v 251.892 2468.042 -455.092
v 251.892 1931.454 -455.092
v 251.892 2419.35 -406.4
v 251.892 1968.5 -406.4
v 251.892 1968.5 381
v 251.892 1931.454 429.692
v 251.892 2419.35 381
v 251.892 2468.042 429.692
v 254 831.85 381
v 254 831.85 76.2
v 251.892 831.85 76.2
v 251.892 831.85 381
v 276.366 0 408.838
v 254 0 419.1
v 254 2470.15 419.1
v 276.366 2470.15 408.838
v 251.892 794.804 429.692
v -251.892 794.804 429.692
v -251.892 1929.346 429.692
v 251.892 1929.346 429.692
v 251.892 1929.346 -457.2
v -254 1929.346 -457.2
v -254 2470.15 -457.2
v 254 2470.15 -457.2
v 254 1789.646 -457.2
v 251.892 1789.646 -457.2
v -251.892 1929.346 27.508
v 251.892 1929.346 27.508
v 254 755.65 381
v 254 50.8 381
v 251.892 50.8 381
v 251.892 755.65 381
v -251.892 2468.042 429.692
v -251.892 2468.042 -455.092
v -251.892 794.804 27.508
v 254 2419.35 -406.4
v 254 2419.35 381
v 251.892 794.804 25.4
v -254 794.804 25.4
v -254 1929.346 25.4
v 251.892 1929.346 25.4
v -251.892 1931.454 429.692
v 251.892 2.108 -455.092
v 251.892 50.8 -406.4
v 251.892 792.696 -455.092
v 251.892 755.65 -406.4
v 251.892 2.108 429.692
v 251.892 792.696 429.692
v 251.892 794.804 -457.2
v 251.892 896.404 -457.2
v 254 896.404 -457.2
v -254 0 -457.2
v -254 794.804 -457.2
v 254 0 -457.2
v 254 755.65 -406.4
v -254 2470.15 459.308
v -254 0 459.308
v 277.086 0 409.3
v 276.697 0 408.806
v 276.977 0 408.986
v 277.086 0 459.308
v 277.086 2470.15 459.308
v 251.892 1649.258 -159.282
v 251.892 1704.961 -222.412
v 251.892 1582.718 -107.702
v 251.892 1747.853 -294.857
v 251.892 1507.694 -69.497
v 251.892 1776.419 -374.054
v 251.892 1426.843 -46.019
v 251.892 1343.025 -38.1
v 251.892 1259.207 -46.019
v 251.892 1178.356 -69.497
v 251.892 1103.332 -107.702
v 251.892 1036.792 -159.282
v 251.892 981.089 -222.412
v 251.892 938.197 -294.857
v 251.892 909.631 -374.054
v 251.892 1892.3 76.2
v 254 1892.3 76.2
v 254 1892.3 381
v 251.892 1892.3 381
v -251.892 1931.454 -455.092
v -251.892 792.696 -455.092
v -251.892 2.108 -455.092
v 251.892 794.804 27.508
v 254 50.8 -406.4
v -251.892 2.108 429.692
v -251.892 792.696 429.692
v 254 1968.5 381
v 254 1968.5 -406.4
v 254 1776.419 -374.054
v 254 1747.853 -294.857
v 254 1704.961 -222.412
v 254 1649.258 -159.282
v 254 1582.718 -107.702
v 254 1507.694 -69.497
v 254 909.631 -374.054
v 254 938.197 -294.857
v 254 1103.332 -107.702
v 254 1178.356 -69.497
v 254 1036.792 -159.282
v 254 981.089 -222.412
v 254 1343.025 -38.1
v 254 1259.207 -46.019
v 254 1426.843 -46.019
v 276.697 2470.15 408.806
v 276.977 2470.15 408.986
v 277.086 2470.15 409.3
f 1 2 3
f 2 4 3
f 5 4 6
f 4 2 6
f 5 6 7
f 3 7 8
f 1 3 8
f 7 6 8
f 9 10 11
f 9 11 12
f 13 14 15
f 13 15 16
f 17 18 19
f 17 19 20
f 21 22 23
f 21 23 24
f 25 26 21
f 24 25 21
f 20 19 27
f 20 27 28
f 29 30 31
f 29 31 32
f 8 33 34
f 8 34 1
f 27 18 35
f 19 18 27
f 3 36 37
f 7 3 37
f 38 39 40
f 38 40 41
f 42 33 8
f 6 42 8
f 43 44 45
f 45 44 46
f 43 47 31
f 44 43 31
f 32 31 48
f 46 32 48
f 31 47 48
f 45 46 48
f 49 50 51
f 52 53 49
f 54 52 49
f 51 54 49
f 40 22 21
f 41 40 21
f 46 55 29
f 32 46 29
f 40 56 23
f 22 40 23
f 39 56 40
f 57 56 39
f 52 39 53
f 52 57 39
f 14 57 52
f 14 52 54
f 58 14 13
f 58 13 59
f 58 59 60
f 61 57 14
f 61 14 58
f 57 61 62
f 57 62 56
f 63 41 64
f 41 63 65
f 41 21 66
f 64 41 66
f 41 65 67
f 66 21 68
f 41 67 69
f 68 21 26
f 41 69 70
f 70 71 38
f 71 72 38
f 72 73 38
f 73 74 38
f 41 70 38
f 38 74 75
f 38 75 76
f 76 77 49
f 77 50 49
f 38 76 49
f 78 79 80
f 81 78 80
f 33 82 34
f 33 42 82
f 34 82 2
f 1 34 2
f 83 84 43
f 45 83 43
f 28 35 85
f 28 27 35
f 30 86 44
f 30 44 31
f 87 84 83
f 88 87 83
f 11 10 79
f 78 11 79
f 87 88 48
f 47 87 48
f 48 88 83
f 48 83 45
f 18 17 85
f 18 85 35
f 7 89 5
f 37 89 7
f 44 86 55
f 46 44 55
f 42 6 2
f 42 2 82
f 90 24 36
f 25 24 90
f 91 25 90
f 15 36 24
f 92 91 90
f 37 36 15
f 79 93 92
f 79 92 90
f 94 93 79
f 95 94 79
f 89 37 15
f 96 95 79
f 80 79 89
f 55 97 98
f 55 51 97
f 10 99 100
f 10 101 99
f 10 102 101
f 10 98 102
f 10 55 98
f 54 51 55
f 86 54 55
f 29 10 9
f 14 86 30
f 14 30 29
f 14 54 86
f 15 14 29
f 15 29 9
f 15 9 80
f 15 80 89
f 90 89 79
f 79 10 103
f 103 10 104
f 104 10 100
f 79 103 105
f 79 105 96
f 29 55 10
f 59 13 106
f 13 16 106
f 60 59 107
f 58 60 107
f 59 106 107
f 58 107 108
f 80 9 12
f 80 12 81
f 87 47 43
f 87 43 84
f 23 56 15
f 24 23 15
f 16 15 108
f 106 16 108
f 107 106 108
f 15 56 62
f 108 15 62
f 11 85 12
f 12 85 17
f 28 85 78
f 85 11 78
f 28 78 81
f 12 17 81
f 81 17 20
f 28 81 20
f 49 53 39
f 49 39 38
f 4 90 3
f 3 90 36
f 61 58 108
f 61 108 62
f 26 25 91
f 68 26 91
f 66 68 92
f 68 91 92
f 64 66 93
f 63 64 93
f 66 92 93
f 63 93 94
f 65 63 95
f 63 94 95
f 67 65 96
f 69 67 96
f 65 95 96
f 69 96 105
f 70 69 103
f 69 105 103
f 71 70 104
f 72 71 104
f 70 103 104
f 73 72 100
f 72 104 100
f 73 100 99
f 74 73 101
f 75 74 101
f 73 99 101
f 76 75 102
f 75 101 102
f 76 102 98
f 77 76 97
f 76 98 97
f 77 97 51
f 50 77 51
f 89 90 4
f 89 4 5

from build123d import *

# Parameters (mm, degrees)
F0_W      = 508
F0_H      = 914.4
F1_DEPTH  = 2470.15
F2_W      = 704.85
F2_H      = 787.4
F2_W_2    = 1060.45
F2_H_2    = 304.8
F2_W_3    = 450.85
F3_DEPTH  = 505.8918
F4_W      = 503.7836
F4_H      = 704.85
F5_DEPTH  = 48.6918
F6_W      = 503.7836
F6_H      = 704.85
F7_DEPTH  = 48.6918
F8_W      = 503.7836
F8_H      = 884.7836
F9_DEPTH  = 48.6918
F10_W     = 503.7836
F10_H     = 884.7836
F11_DEPTH = 37.0459
F12_W     = 503.7836
F12_H     = 1060.45
F13_DEPTH = 48.6918
F14_W     = 503.7836
F14_H     = 1060.45
F15_DEPTH = 48.6918
F16_W     = 503.7836
F16_H     = 402.1836
F17_DEPTH = 37.0459
F18_W     = 503.7836
F18_H     = 402.1836
F19_DEPTH = 37.0459
F20_W     = 503.7836
F20_H     = 450.85
F21_DEPTH = 48.6918
F22_W     = 503.7836
F22_H     = 450.85
F23_DEPTH = 48.6918
F24_W     = 503.7836
F24_H     = 884.7836
F25_DEPTH = 37.0459
F26_W     = 503.7836
F26_H     = 884.7836
F27_DEPTH = 48.6918
F28_W     = 505.8918
F28_H     = 1134.5418
F29_DEPTH = 482.6
F31_DEPTH = 508.001
F33_DEPTH = 2470.15
F34_R     = 0.508


with BuildPart() as f1:
    # F0 (on Front) → F1 (new body)
    with BuildSketch(Plane.XZ):
        Rectangle(F0_W, F0_H)
    extrude(amount=-F1_DEPTH)

    # F2 (on face) → F3 (cut)
    with BuildSketch(Plane.YZ.offset(254)):
        with Locations((403.225, -12.7)):
            Rectangle(F2_W, F2_H)
        with Locations((1362.075, 228.6)):
            Rectangle(F2_W_2, F2_H_2)
        with Locations((2193.925, -12.7)):
            Rectangle(F2_W_3, F2_H)
    extrude(amount=-F3_DEPTH, mode=Mode.SUBTRACT)

    # F4 (on face) → F5 (cut)
    with BuildSketch(Plane.XY.offset(-406.4)):
        with Locations((0, 403.225)):
            Rectangle(F4_W, F4_H)
    extrude(amount=-F5_DEPTH, mode=Mode.SUBTRACT)

    # F6 (on face) → F7 (cut)
    with BuildSketch(Plane(origin=(0, 0, 381), x_dir=(1, 0, 0), z_dir=(0, 0, -1))):
        with Locations((0, -403.225)):
            Rectangle(F6_W, F6_H)
    extrude(amount=-F7_DEPTH, mode=Mode.SUBTRACT)

    # F8 (on face) → F9 (cut)
    with BuildSketch(Plane(origin=(0, 50.8, 0), x_dir=(-1, 0, 0), z_dir=(0, 1, 0))):
        with Locations((0, -12.7)):
            Rectangle(F8_W, F8_H)
    extrude(amount=-F9_DEPTH, mode=Mode.SUBTRACT)

    # F10 (on face) → F11 (cut)
    with BuildSketch(Plane.XZ.offset(-755.65)):
        with Locations((0, -12.7)):
            Rectangle(F10_W, F10_H)
    extrude(amount=-F11_DEPTH, mode=Mode.SUBTRACT)

    # F12 (on face) → F13 (cut)
    with BuildSketch(Plane.XY.offset(76.2)):
        with Locations((0, 1362.075)):
            Rectangle(F12_W, F12_H)
    extrude(amount=-F13_DEPTH, mode=Mode.SUBTRACT)

    # F14 (on face) → F15 (cut)
    with BuildSketch(Plane(origin=(0, 0, 381), x_dir=(1, 0, 0), z_dir=(0, 0, -1))):
        with Locations((0, -1362.075)):
            Rectangle(F14_W, F14_H)
    extrude(amount=-F15_DEPTH, mode=Mode.SUBTRACT)

    # F16 (on face) → F17 (cut)
    with BuildSketch(Plane(origin=(0, 831.85, 0), x_dir=(-1, 0, 0), z_dir=(0, 1, 0))):
        with Locations((0, 228.6)):
            Rectangle(F16_W, F16_H)
    extrude(amount=-F17_DEPTH, mode=Mode.SUBTRACT)

    # F18 (on face) → F19 (cut)
    with BuildSketch(Plane.XZ.offset(-1892.3)):
        with Locations((0, 228.6)):
            Rectangle(F18_W, F18_H)
    extrude(amount=-F19_DEPTH, mode=Mode.SUBTRACT)

    # F20 (on face) → F21 (cut)
    with BuildSketch(Plane.XY.offset(-406.4)):
        with Locations((0, 2193.925)):
            Rectangle(F20_W, F20_H)
    extrude(amount=-F21_DEPTH, mode=Mode.SUBTRACT)

    # F22 (on face) → F23 (cut)
    with BuildSketch(Plane(origin=(0, 0, 381), x_dir=(1, 0, 0), z_dir=(0, 0, -1))):
        with Locations((0, -2193.925)):
            Rectangle(F22_W, F22_H)
    extrude(amount=-F23_DEPTH, mode=Mode.SUBTRACT)

    # F24 (on face) → F25 (cut)
    with BuildSketch(Plane(origin=(0, 1968.5, 0), x_dir=(-1, 0, 0), z_dir=(0, 1, 0))):
        with Locations((0, -12.7)):
            Rectangle(F24_W, F24_H)
    extrude(amount=-F25_DEPTH, mode=Mode.SUBTRACT)

    # F26 (on face) → F27 (cut)
    with BuildSketch(Plane.XZ.offset(-2419.35)):
        with Locations((0, -12.7)):
            Rectangle(F26_W, F26_H)
    extrude(amount=-F27_DEPTH, mode=Mode.SUBTRACT)

    # F28 (on face) → F29 (cut)
    with BuildSketch(Plane(origin=(0, 0, -457.2), x_dir=(1, 0, 0), z_dir=(0, 0, -1))):
        with Locations((-1.0541, -1362.075)):
            Rectangle(F28_W, F28_H)
    extrude(amount=-F29_DEPTH, mode=Mode.SUBTRACT)

    # F30 (on face) → F31 (cut, through all)
    with BuildSketch(Plane.YZ.offset(254)):
        with BuildLine():
            Line((896.4041, -457.2), (1789.6459, -457.2))
            ThreePointArc((1789.6459, -457.2), (1343.025, -38.1), (896.4041, -457.2))
        make_face()
    extrude(amount=-F31_DEPTH, mode=Mode.SUBTRACT)

    # F32 (on face) → F33 (join, through all)
    with BuildSketch(Plane.XZ):
        Polygon((277.0862247403, 459.3082), (-254, 459.3082), (-254, 457.2), (254, 457.2), (254, 419.1), (277.0862247403, 408.5082), align=None)
    extrude(amount=-F33_DEPTH)

    # F34
    f34_edges = [f1.edges().sort_by_distance(p)[0] for p in [
        (277.086225, 1235.075, 408.5082),
    ]]
    fillet(f34_edges, radius=F34_R)


solid = f1.part
